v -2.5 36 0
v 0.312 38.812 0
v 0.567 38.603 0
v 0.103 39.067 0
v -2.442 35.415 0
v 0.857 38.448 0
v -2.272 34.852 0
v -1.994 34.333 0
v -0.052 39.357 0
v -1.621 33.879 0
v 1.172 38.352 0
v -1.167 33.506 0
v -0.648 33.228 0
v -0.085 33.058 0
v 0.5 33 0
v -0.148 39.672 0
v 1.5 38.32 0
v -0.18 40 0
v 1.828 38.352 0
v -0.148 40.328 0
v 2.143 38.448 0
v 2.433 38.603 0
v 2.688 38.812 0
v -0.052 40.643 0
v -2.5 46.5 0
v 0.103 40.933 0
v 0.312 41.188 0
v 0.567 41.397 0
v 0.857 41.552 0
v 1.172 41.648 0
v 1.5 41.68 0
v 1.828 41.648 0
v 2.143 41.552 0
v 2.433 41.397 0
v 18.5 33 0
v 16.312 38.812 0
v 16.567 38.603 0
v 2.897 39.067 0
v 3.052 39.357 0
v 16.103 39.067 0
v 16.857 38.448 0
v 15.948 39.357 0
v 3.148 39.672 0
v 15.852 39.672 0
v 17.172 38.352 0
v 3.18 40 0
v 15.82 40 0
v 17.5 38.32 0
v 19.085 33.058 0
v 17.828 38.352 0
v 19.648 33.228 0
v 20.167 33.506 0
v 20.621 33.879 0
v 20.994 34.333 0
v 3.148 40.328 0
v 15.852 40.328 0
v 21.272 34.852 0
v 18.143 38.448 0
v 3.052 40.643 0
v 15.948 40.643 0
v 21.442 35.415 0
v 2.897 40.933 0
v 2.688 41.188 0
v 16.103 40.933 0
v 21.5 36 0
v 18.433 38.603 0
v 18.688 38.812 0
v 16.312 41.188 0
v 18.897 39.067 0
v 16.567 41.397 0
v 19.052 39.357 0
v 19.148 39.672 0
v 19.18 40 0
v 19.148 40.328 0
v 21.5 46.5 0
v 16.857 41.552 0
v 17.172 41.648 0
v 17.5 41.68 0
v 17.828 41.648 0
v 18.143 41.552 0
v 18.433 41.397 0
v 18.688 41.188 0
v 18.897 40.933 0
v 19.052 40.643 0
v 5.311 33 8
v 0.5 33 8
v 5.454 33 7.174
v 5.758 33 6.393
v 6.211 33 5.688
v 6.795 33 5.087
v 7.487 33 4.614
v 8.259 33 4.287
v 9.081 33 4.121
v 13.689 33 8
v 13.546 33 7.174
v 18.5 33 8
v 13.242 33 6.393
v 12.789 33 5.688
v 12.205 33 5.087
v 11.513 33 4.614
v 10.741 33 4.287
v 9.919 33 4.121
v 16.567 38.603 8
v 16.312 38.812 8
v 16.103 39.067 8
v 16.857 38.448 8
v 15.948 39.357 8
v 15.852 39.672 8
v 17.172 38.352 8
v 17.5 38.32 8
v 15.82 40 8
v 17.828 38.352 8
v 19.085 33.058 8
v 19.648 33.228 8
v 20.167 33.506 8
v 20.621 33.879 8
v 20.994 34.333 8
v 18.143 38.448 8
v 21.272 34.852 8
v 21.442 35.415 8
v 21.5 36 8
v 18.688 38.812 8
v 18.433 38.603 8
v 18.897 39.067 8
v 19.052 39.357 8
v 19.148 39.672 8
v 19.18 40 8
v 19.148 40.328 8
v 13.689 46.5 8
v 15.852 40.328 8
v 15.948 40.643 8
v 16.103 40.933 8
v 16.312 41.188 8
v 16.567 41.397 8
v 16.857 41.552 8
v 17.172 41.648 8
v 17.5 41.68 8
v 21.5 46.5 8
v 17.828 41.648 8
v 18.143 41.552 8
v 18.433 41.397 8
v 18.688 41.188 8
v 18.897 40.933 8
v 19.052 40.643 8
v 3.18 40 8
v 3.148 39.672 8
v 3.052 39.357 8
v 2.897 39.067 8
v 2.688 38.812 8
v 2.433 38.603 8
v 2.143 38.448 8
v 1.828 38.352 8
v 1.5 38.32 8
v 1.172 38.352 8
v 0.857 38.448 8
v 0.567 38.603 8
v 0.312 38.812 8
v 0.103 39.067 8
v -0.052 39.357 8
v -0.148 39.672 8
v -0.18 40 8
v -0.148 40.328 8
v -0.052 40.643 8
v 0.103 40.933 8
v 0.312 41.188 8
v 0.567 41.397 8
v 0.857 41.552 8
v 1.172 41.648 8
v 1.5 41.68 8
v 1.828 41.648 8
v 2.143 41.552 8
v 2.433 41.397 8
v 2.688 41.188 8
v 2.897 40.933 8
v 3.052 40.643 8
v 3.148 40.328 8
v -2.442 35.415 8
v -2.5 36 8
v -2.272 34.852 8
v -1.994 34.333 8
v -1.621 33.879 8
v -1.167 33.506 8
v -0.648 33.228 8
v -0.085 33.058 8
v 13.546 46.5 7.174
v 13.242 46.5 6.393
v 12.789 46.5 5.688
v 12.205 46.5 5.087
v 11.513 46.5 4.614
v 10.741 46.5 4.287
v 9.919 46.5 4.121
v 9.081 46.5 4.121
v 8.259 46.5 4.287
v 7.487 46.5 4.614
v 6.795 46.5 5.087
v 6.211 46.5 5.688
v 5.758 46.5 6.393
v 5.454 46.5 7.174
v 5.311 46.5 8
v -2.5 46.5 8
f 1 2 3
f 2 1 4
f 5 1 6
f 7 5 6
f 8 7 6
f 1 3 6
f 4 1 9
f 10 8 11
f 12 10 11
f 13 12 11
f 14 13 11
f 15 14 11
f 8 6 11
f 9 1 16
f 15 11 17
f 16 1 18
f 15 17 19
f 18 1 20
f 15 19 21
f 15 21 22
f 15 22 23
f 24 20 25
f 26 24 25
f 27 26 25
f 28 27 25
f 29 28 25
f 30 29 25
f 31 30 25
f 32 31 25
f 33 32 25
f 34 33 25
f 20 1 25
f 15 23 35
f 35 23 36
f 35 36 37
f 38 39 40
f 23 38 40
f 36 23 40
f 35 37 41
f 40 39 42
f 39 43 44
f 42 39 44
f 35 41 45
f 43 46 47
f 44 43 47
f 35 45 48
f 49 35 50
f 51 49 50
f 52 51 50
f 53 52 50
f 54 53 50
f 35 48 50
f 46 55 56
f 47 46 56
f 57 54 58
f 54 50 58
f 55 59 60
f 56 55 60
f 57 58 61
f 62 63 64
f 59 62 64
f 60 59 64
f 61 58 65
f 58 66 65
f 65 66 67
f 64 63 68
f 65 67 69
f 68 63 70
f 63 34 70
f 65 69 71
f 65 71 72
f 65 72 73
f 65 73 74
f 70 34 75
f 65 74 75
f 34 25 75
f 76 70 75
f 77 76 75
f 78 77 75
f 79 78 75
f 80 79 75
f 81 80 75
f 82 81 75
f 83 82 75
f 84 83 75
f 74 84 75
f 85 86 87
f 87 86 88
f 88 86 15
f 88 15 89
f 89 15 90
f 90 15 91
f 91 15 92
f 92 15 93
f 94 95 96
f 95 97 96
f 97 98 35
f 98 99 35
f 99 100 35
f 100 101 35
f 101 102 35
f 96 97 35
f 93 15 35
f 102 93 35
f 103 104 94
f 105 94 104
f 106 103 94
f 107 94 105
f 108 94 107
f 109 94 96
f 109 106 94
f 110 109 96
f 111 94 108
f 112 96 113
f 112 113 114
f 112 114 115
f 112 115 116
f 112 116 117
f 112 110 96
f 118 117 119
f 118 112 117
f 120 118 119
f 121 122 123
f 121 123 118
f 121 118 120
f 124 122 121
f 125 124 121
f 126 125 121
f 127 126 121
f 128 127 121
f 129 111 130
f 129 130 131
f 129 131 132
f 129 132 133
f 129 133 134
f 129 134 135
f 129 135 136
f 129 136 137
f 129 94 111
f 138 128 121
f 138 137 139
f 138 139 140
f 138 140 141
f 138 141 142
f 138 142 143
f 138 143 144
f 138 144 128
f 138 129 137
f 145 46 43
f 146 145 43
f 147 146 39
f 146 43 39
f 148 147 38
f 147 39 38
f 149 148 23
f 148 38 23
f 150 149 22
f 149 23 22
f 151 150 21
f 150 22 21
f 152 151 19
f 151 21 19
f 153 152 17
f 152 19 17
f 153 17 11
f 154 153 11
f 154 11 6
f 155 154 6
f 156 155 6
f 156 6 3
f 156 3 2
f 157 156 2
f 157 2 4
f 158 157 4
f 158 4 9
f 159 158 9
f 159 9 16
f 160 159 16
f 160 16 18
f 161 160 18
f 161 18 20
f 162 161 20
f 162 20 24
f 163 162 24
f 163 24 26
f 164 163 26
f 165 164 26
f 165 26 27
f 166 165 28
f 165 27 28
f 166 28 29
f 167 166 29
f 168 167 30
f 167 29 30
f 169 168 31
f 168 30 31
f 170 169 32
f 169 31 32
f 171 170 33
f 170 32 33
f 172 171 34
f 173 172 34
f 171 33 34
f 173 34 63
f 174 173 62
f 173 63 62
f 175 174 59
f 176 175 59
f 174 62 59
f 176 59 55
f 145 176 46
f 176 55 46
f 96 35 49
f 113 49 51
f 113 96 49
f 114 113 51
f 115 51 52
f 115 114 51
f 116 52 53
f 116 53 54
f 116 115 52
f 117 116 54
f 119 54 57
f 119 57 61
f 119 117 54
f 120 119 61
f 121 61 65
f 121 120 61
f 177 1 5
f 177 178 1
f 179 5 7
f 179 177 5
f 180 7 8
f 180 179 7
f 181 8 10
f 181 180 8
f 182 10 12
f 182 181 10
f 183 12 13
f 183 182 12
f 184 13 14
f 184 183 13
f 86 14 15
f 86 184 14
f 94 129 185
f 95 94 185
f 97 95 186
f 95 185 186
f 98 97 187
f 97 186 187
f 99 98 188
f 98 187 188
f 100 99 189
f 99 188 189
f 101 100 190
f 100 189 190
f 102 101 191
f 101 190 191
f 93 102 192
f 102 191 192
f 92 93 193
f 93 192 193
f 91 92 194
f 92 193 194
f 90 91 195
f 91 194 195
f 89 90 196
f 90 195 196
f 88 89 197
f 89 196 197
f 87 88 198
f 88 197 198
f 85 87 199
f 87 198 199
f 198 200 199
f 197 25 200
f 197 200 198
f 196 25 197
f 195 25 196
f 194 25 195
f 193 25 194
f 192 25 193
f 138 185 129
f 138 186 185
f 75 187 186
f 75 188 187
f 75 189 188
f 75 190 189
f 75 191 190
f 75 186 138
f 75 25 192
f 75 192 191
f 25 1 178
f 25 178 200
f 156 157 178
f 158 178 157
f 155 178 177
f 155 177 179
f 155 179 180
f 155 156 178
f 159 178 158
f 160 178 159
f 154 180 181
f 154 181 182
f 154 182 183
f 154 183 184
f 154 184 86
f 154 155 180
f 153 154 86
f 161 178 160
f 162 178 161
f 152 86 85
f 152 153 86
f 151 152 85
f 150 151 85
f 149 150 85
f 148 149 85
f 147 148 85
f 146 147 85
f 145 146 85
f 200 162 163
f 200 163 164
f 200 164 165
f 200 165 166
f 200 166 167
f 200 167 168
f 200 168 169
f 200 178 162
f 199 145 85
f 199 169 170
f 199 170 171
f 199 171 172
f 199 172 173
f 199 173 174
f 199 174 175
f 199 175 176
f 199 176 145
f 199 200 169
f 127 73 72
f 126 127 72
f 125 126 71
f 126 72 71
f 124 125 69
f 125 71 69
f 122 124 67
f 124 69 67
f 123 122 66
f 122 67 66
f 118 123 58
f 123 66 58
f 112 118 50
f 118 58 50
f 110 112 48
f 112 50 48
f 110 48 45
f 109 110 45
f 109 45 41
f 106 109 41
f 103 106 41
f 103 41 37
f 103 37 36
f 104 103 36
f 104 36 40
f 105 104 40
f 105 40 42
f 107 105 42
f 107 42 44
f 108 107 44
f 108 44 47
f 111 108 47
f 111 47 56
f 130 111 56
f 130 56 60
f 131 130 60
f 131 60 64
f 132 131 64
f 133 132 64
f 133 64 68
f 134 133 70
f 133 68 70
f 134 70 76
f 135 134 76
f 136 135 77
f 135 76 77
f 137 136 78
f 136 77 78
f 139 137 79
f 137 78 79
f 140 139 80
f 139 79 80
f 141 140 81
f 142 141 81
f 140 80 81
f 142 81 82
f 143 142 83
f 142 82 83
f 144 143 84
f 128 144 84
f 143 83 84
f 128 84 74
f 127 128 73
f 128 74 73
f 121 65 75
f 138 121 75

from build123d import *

# Parameters (mm, degrees)
BOX002_W        = 24
BOX002_H        = 13.5
BOX002_DEPTH    = 8
SKETCH003_R     = 4.2
POCKET003_DEPTH = 14
SKETCH004_R     = 1.68
POCKET004_DEPTH = 8.001
FILLET_R        = 3


with BuildPart() as part:
    # Box002 → Box002 (new body)
    with BuildSketch(Plane(origin=(-2.5, 33, 0), x_dir=(1, 0, 0), z_dir=(0, 0, 1))):
        with Locations((12, 6.75)):
            Rectangle(BOX002_W, BOX002_H)
    extrude(amount=BOX002_DEPTH)

    # Sketch003 → Pocket003 (cut)
    with BuildSketch(Plane(origin=(-2.5, 46.5, 0), x_dir=(-1, 0, 0), z_dir=(0, 1, 0))):
        with Locations((-12, 8.3)):
            Circle(SKETCH003_R)
    extrude(amount=-POCKET003_DEPTH, mode=Mode.SUBTRACT)

    # Sketch004 → Pocket004 (cut, through all)
    with BuildSketch(Plane(origin=(-2.5, 33, 0), x_dir=(1, 0, 0), z_dir=(0, 0, -1))):
        with Locations((4, -7)):
            Circle(SKETCH004_R)
        with Locations((20, -7)):
            Circle(SKETCH004_R)
    extrude(amount=-POCKET004_DEPTH, mode=Mode.SUBTRACT)

    # Fillet
    fillet_edges = [part.edges().sort_by_distance(p)[0] for p in [
        (21.5, 33, 4),
        (-2.5, 33, 4),
    ]]
    fillet(fillet_edges, radius=FILLET_R)


solid = part.part
